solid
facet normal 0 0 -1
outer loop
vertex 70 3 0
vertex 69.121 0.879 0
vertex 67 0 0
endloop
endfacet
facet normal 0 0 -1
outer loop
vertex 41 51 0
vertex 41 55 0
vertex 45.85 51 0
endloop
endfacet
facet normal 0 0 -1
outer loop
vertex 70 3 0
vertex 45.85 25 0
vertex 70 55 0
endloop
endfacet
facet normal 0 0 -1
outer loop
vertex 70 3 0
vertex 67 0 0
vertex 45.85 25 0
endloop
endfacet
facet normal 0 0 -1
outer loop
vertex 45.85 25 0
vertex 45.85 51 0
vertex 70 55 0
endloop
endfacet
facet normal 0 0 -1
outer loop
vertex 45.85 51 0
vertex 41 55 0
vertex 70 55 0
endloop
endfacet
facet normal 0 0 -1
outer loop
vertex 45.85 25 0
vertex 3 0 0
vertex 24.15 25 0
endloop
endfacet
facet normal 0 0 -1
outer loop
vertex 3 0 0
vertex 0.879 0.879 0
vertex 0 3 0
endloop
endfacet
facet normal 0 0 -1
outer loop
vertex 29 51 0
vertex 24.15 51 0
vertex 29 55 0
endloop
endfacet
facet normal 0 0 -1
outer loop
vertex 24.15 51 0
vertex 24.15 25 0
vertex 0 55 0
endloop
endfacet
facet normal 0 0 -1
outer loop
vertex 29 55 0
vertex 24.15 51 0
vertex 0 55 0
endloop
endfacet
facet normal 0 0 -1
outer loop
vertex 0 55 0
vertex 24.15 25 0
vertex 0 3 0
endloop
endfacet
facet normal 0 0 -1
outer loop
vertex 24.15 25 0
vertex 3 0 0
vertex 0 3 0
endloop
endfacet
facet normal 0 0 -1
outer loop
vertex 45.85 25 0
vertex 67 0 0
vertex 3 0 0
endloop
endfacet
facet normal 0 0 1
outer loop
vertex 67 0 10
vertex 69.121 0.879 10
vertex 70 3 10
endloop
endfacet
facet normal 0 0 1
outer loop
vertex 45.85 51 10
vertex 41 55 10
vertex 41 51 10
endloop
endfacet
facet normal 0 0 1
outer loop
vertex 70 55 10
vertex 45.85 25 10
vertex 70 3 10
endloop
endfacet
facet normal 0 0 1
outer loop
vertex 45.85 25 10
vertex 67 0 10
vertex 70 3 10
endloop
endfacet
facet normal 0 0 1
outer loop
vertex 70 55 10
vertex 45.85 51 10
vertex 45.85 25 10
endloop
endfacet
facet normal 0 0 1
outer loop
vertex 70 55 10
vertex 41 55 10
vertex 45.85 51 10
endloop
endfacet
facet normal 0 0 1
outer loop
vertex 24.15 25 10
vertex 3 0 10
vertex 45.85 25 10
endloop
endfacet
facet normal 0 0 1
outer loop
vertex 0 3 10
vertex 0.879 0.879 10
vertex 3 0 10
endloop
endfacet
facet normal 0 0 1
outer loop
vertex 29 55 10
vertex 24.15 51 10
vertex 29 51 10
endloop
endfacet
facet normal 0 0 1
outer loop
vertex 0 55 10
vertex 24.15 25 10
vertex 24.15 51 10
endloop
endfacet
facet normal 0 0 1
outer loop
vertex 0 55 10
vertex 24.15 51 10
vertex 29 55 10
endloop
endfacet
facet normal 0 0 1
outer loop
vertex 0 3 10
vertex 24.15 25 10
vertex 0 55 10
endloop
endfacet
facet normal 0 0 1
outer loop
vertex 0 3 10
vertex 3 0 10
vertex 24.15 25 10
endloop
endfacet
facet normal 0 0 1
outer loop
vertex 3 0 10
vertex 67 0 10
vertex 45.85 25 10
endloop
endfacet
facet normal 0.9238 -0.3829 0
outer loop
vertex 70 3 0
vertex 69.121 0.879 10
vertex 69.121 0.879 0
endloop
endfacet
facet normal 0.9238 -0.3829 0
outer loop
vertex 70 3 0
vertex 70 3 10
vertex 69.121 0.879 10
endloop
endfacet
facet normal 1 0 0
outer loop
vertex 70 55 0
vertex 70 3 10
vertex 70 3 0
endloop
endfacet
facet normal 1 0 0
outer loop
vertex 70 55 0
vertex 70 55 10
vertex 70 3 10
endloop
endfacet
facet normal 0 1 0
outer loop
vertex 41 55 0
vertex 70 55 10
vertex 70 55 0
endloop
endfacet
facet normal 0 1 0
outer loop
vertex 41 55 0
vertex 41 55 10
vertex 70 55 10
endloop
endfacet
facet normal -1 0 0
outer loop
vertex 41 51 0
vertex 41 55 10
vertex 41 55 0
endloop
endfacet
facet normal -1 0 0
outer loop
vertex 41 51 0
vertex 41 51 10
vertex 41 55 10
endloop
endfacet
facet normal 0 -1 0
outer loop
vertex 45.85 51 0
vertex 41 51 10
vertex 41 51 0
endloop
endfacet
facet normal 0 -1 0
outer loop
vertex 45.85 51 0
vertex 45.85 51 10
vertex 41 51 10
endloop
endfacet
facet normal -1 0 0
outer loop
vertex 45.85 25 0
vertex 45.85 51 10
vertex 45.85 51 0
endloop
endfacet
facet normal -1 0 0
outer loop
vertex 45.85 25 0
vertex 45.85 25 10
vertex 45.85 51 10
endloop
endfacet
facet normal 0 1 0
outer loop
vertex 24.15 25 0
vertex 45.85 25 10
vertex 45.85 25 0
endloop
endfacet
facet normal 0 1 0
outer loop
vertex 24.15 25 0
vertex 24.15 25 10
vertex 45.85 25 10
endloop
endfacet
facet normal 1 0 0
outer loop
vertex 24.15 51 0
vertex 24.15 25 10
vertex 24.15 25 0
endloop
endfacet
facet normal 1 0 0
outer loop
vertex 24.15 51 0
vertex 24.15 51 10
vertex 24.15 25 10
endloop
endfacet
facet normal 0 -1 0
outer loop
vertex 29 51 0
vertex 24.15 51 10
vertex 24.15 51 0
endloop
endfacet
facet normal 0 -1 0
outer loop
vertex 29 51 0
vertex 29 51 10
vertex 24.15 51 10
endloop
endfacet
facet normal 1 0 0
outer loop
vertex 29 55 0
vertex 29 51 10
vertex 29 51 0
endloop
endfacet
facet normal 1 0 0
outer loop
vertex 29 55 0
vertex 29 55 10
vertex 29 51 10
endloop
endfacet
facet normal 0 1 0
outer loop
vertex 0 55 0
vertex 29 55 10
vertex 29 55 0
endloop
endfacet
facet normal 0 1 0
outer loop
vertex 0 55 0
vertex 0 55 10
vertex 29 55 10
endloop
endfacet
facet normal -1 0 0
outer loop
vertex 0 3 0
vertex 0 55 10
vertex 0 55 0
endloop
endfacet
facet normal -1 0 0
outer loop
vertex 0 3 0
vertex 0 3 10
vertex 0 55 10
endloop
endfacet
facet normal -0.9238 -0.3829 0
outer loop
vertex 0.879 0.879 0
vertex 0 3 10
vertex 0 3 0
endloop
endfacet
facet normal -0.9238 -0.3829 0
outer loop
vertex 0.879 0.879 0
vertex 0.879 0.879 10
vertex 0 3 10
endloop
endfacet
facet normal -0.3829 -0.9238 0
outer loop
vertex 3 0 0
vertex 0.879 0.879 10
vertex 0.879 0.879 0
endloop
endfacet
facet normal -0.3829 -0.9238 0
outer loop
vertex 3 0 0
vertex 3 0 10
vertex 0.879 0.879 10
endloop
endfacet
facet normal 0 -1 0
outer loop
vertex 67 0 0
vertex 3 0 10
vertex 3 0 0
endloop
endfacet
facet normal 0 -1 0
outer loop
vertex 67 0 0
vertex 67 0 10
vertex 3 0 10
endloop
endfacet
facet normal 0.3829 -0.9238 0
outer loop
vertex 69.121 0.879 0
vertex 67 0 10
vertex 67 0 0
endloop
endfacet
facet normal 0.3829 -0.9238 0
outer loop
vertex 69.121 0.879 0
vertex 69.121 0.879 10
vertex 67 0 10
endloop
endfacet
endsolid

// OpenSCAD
$fn = 32;

// ----------------------------------------------------------------------
// Window plate: 70 x 55 mm, 1 open windows
// ----------------------------------------------------------------------

// --- parameters (mm) ---
profile_height = 10;      // extrusion height
profile_points = 16;      // points of the closed outline

profile = [[0, 3], [0.879, 0.879], [3, 0], [67, 0], [69.121, 0.879], [70, 3], [70, 55], [41, 55], [41, 51], [45.85, 51], [45.85, 25], [24.15, 25], [24.15, 51], [29, 51], [29, 55], [0, 55]];  // single closed polygon, 16 points, counter clockwise

// --- the one profile operation ---
linear_extrude(height = profile_height) polygon(points = profile);
